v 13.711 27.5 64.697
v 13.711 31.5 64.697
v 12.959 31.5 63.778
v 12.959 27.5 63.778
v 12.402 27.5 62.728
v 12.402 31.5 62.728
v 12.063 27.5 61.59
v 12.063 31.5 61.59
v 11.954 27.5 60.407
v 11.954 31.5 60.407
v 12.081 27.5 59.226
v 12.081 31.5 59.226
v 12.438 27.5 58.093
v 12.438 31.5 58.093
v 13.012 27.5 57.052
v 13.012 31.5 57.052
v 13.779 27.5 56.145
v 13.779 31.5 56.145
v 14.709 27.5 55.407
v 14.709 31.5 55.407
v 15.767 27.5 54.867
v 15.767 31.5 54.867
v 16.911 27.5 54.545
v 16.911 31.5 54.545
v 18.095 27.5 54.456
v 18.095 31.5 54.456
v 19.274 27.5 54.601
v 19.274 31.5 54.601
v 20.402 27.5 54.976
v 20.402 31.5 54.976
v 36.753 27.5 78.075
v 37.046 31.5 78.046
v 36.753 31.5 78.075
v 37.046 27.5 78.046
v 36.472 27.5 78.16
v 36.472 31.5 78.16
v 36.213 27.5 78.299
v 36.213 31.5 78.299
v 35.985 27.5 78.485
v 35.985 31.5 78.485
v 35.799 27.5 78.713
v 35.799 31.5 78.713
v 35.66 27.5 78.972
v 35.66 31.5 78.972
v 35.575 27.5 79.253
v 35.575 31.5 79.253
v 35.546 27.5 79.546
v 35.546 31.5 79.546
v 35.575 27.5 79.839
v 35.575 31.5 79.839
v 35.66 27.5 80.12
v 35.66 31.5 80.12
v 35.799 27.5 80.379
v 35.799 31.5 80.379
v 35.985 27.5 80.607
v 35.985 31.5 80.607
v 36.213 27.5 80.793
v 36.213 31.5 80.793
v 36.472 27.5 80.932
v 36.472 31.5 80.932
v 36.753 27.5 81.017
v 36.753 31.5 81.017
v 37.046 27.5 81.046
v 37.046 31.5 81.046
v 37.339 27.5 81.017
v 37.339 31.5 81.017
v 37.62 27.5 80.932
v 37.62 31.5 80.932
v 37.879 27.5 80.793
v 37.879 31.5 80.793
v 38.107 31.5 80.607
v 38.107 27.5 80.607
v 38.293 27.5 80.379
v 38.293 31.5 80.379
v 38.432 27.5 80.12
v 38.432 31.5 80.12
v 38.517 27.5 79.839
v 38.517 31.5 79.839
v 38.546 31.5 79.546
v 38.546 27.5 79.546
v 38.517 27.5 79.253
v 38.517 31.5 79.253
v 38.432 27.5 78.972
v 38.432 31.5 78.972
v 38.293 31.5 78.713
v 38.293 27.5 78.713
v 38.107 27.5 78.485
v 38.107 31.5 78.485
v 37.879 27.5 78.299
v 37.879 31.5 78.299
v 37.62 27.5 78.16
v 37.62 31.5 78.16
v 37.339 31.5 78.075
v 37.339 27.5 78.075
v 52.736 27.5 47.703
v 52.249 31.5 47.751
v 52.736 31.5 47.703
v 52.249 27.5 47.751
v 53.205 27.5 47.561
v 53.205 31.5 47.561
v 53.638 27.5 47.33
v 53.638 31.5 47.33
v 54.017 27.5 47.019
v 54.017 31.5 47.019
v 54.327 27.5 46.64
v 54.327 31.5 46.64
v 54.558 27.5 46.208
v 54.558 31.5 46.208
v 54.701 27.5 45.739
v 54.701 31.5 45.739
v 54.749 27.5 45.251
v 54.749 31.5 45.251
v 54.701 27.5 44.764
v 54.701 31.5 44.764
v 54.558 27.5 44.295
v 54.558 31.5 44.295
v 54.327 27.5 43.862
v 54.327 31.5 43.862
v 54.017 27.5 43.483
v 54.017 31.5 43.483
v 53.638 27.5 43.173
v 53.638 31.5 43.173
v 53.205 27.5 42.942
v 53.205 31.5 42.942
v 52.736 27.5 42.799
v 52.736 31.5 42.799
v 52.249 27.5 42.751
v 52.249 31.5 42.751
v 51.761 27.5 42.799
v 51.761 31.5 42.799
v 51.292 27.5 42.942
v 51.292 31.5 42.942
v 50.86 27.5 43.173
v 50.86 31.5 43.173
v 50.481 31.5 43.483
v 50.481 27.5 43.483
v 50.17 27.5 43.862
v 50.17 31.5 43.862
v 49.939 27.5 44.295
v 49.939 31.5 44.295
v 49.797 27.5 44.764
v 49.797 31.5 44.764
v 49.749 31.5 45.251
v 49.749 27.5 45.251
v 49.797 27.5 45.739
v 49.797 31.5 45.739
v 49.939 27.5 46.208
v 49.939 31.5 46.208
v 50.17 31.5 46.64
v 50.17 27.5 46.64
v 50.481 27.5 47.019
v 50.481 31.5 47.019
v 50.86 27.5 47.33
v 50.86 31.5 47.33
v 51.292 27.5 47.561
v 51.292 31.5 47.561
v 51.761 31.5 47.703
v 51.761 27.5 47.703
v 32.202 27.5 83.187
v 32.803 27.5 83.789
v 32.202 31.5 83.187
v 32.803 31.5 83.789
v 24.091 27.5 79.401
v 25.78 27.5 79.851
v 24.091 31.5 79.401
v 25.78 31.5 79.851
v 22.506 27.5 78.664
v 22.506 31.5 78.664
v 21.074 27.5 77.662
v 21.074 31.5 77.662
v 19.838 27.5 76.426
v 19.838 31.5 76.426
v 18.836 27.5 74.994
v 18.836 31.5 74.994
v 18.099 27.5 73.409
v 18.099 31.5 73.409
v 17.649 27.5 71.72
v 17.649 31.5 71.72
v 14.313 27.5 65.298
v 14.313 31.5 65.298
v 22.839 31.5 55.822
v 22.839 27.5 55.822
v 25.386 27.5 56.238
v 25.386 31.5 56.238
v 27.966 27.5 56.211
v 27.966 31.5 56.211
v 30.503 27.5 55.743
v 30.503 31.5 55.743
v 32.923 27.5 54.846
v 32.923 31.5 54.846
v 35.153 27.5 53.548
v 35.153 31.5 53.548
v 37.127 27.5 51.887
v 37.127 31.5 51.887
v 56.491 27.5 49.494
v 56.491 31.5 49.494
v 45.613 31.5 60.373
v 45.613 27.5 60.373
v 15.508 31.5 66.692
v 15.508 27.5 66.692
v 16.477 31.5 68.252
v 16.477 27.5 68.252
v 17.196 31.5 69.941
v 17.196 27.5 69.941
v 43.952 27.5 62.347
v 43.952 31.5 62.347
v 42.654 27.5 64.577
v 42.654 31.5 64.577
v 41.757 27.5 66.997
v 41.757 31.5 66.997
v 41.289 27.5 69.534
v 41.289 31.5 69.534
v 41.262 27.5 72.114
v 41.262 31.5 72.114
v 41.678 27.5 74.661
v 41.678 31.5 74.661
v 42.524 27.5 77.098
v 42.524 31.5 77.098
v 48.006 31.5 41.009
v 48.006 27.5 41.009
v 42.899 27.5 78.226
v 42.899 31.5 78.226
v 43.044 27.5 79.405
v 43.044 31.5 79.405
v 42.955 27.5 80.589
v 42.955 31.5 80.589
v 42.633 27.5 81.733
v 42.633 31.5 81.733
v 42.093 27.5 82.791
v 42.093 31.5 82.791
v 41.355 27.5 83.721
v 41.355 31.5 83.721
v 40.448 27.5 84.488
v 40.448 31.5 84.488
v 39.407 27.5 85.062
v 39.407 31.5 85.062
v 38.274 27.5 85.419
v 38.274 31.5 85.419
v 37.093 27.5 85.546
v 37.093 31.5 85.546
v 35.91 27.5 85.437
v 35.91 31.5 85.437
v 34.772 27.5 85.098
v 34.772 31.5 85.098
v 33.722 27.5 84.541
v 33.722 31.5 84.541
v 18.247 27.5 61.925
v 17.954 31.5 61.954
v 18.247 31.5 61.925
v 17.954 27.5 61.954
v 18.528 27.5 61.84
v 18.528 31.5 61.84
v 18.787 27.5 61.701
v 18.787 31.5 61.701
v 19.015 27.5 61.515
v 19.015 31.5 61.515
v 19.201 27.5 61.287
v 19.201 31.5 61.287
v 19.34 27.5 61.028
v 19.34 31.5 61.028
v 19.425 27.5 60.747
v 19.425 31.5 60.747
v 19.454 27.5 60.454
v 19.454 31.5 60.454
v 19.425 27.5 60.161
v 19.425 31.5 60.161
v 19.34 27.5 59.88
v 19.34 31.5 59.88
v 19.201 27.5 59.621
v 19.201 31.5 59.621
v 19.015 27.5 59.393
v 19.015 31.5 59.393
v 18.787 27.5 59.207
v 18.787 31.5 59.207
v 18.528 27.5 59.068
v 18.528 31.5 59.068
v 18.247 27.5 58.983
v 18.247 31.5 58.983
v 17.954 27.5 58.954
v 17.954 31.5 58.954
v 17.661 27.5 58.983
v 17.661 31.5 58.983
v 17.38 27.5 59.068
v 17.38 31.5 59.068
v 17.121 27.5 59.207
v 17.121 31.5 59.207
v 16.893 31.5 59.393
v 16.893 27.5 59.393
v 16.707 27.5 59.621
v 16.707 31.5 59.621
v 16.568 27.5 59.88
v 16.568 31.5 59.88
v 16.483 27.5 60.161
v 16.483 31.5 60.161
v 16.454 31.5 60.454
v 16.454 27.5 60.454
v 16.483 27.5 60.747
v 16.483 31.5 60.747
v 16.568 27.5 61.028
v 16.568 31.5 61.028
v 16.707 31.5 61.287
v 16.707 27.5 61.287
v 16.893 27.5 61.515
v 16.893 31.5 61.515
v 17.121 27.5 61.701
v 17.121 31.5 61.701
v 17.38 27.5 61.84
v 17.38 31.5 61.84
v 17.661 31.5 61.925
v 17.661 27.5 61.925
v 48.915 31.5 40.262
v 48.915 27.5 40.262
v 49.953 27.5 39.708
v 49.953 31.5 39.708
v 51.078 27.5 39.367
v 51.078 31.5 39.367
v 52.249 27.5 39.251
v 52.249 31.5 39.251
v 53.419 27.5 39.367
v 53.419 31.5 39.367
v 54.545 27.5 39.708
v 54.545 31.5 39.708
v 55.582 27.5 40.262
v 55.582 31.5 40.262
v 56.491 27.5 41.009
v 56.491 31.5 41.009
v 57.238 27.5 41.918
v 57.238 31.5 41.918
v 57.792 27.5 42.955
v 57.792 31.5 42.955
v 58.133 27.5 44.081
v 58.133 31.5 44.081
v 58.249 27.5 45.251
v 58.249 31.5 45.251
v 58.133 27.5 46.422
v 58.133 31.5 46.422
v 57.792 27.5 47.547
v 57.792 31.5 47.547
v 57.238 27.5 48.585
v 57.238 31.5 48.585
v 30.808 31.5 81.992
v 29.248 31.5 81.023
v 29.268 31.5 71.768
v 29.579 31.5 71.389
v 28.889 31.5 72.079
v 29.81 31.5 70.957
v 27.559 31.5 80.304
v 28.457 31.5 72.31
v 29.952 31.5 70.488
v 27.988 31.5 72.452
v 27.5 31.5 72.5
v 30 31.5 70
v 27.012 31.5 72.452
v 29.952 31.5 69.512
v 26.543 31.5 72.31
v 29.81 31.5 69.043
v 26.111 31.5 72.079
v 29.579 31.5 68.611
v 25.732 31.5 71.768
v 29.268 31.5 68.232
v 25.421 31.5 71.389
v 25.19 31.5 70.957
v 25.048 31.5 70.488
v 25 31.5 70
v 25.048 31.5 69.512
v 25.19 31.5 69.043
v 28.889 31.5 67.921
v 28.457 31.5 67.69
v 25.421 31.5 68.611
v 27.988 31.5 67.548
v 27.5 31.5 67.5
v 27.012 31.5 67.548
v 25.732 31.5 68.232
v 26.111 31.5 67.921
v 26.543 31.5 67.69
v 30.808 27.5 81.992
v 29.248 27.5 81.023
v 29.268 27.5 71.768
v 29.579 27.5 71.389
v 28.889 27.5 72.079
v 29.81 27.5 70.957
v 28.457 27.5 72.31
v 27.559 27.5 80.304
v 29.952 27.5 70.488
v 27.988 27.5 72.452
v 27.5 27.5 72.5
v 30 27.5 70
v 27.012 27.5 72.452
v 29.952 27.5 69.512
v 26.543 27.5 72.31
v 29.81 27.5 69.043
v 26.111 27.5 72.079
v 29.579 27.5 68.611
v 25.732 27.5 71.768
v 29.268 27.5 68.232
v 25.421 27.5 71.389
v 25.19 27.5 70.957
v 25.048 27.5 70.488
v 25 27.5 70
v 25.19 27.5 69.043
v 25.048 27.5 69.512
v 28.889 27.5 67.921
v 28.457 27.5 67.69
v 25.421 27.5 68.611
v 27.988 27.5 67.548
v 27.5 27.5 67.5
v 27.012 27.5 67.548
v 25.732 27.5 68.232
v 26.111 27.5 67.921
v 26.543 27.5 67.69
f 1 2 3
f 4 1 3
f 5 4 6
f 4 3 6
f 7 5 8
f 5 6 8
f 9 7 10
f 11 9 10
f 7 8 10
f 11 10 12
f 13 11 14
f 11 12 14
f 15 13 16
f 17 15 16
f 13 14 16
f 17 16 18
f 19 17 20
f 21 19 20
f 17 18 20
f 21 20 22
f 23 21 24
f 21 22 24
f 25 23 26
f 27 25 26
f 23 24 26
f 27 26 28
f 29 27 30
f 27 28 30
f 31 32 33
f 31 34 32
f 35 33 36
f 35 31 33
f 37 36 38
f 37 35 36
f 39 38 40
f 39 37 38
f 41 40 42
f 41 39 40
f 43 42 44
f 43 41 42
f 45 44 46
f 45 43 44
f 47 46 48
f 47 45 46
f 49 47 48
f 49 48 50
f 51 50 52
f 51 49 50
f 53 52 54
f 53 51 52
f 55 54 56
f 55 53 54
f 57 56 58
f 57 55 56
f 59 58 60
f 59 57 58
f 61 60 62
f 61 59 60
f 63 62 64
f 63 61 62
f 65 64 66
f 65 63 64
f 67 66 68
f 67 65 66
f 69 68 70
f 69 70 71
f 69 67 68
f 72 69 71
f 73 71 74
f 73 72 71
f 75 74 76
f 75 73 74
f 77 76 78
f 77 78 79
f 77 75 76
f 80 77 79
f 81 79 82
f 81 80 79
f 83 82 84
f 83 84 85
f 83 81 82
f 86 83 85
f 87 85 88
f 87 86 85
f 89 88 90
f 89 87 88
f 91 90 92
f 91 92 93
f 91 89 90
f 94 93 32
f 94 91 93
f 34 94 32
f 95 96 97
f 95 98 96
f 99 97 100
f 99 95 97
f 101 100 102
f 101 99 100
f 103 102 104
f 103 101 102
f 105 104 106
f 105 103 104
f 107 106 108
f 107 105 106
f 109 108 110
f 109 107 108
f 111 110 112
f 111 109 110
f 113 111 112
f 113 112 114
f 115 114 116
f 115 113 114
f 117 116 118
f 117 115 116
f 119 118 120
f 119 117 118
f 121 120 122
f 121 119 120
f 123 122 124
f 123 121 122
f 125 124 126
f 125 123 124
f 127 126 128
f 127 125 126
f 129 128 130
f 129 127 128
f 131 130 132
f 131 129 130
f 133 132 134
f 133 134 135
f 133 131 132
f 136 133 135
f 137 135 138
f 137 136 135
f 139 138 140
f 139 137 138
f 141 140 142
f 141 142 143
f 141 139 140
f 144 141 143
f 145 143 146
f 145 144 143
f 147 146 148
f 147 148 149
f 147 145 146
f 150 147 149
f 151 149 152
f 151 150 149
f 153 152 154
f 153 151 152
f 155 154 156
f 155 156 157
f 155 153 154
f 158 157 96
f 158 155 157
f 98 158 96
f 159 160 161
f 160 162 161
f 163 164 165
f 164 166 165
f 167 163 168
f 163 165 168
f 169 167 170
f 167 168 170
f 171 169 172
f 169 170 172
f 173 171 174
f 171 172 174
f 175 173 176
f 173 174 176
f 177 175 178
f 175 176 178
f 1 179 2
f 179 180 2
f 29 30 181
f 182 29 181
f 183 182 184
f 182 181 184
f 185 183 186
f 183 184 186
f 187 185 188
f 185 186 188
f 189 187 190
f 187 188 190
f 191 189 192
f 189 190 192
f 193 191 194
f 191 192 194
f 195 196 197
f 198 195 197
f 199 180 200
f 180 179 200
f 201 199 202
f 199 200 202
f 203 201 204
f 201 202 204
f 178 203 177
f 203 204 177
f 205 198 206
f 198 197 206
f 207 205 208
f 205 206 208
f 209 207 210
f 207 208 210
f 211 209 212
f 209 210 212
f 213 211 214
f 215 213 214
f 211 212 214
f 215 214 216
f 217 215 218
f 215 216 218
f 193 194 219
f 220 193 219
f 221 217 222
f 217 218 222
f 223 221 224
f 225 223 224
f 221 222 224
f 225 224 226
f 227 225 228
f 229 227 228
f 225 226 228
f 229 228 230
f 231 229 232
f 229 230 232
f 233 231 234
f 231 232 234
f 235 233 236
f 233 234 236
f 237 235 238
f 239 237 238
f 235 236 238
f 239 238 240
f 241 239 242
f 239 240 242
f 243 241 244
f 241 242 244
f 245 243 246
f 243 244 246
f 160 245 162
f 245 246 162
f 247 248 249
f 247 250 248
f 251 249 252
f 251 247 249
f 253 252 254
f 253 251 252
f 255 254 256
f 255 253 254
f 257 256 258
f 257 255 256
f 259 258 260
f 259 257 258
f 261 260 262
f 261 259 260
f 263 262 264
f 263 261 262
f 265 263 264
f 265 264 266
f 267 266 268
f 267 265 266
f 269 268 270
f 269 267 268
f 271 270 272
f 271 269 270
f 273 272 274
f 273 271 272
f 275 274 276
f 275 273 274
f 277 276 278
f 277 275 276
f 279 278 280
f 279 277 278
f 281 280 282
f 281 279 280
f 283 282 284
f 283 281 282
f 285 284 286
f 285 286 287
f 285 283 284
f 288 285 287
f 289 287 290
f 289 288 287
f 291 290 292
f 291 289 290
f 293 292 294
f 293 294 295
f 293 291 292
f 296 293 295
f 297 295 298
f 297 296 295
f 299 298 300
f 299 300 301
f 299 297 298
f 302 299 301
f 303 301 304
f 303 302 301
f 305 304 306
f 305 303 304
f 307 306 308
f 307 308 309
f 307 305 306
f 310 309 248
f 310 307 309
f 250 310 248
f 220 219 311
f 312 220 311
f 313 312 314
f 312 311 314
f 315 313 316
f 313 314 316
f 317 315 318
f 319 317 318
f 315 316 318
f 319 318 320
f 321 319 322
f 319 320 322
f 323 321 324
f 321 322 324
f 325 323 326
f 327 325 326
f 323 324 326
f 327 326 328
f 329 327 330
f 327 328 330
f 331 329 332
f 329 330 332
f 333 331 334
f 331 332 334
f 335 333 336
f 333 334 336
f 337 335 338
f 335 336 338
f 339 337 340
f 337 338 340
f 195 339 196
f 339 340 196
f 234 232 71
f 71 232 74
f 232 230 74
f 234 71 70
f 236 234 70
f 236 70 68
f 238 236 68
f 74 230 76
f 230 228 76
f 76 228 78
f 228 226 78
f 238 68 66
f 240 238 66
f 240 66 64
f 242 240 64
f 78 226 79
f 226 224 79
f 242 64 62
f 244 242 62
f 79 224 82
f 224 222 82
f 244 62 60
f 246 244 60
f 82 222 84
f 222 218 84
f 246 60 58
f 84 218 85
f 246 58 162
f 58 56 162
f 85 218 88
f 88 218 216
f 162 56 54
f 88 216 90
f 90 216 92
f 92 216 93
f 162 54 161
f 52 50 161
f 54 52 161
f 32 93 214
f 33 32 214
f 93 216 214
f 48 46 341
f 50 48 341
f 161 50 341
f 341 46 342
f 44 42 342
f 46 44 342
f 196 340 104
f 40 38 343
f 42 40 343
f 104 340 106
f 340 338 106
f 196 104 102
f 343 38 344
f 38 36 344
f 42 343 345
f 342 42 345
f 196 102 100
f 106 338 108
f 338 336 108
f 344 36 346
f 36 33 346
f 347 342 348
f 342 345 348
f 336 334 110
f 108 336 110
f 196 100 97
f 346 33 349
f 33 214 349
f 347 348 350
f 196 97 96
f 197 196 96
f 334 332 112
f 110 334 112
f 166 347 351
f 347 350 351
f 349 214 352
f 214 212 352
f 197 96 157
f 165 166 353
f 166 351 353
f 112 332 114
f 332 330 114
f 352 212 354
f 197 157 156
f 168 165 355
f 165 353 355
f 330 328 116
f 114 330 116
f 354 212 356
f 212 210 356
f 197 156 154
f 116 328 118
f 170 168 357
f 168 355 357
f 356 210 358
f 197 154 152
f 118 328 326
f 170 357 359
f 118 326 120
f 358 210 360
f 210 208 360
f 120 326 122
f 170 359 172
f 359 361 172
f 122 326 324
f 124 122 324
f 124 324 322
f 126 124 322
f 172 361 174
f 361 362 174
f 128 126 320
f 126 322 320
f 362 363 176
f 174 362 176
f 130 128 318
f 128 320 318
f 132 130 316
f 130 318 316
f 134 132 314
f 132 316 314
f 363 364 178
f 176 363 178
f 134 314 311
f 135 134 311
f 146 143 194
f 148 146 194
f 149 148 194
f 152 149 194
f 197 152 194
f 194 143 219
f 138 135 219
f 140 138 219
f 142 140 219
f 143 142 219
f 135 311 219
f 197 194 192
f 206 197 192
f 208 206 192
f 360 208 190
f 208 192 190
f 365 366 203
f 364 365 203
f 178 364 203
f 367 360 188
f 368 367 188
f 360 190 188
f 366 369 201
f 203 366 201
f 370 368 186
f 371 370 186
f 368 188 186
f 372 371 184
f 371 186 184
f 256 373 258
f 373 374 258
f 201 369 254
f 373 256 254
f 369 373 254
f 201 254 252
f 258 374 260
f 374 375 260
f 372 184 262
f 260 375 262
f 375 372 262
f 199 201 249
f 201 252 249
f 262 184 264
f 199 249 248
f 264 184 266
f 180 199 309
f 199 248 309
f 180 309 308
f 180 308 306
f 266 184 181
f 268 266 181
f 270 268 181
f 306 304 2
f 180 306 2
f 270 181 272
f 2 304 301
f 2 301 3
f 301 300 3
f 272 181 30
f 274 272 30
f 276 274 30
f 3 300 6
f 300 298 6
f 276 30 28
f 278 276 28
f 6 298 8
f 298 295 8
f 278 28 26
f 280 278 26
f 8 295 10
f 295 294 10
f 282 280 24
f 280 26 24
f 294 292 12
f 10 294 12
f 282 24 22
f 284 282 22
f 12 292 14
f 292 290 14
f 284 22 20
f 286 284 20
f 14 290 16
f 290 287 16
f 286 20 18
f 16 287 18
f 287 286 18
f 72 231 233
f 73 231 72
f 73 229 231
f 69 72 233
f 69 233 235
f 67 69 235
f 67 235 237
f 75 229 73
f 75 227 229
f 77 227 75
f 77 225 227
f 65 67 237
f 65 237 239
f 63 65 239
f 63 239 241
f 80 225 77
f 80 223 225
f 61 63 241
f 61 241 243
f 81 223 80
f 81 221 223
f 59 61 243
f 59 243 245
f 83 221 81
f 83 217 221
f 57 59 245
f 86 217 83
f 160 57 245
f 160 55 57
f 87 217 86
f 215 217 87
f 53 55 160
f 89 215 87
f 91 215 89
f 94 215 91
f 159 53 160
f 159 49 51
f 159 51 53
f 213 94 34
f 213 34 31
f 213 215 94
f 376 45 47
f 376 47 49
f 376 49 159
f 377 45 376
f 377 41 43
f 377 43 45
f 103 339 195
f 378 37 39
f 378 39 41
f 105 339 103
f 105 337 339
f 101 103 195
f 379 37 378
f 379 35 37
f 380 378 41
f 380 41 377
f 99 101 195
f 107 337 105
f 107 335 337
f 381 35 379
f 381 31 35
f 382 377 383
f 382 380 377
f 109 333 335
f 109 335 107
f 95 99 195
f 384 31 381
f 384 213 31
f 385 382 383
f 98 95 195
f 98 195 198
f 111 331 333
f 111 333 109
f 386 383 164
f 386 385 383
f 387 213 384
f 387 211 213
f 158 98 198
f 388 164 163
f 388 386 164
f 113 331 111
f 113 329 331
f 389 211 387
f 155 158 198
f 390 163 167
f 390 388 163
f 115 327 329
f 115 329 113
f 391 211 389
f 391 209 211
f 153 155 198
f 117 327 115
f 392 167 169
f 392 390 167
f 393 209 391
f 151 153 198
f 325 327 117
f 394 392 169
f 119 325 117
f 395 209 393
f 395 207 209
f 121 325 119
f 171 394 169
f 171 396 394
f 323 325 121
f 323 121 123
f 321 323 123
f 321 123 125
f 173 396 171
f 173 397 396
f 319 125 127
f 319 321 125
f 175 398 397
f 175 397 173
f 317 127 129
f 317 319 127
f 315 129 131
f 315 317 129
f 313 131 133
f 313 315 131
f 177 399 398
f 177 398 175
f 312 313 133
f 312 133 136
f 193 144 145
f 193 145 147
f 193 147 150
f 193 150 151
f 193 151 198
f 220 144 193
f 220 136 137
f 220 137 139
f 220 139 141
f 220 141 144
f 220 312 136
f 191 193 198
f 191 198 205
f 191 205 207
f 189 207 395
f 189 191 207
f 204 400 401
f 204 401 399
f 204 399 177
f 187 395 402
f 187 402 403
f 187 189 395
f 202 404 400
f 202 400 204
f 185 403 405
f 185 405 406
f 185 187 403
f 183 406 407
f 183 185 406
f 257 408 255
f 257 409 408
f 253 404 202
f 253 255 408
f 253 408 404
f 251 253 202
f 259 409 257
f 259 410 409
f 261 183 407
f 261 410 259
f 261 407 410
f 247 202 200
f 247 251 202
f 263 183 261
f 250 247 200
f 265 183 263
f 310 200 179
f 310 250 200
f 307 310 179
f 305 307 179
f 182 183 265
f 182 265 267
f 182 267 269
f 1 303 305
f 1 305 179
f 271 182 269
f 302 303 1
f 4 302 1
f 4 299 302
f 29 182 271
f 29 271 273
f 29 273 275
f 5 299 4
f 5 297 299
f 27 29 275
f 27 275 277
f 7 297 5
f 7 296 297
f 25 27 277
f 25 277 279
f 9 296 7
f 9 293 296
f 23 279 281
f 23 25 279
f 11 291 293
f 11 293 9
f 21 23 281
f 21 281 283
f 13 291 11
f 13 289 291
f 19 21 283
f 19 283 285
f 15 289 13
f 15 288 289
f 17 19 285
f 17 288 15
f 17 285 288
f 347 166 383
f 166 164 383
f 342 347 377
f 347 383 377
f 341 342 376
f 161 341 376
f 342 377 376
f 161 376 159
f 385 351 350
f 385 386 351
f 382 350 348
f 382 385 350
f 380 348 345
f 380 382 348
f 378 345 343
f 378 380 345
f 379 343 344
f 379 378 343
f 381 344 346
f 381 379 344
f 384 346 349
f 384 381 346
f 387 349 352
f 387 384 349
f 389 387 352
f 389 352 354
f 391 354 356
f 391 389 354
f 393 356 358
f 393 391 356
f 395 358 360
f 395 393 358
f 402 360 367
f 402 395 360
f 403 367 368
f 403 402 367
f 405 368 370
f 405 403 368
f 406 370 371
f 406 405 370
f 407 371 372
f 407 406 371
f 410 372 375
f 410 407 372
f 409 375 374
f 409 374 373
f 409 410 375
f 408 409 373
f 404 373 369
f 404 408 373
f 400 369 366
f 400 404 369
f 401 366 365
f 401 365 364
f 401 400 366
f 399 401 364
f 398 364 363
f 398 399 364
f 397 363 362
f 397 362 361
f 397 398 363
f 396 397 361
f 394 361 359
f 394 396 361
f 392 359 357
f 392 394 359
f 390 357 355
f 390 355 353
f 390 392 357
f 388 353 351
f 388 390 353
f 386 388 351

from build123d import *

# Parameters (mm, degrees)
ESQUISSE1_R        = 1.5
ESQUISSE1_R_2      = 2.5
BOSS_EXTRU_1_DEPTH = 2
CONG_1_R           = 12


with BuildPart() as part:
    # Esquisse1 → Boss.-Extru.1 (new, symmetric)
    with BuildSketch(Plane(origin=(0, 29.5, 0), x_dir=(1, 0, 0), z_dir=(0, 1, 0))):
        with BuildLine():
            Line((56.491378029, -49.493903346), (45.612572194, -60.37270918))
            ThreePointArc((45.612572194, -60.37270918), (41.468560381, -68.255453254), (42.524007936, -77.09833279))
            ThreePointArc((42.524007936, -77.09833279), (40.447621803, -84.488468372), (32.803300859, -83.788582233))
            Line((32.803300859, -83.788582233), (28.914213562, -79.899494937))
            ThreePointArc((28.914213562, -79.899494937), (20.428932188, -77.071067812), (17.600505063, -68.585786438))
            Line((17.600505063, -68.585786438), (13.711417767, -64.696699141))
            ThreePointArc((13.711417767, -64.696699141), (13.011531628, -57.052378197), (20.40166721, -54.975992064))
            ThreePointArc((20.40166721, -54.975992064), (29.244546746, -56.031439619), (37.12729082, -51.887427806))
            Line((37.12729082, -51.887427806), (48.006096654, -41.008621971))
            ThreePointArc((48.006096654, -41.008621971), (56.491378029, -41.008621971), (56.491378029, -49.493903346))
        make_face()
        with Locations(Location((17.954058454, -60.454058454, 0), (0, 0, 270))):
            Circle(ESQUISSE1_R, mode=Mode.SUBTRACT)
        with Locations(Location((37.045941546, -79.545941546, 0), (0, 0, 90))):
            Circle(ESQUISSE1_R, mode=Mode.SUBTRACT)
        with Locations(Location((27.5, -70, 0), (0, 0, 270))):
            Circle(ESQUISSE1_R_2, mode=Mode.SUBTRACT)
        with Locations(Location((52.248737342, -45.251262658, 0), (0, 0, 270))):
            Circle(ESQUISSE1_R_2, mode=Mode.SUBTRACT)
    extrude(amount=BOSS_EXTRU_1_DEPTH, both=True)

    # Congé1
    cong_1_edges = [part.edges().sort_by_distance(p)[0] for p in [
        (28.914213562, 29.5, 79.899494937),
        (17.600505063, 29.5, 68.585786438),
    ]]
    fillet(cong_1_edges, radius=CONG_1_R)


solid = part.part
